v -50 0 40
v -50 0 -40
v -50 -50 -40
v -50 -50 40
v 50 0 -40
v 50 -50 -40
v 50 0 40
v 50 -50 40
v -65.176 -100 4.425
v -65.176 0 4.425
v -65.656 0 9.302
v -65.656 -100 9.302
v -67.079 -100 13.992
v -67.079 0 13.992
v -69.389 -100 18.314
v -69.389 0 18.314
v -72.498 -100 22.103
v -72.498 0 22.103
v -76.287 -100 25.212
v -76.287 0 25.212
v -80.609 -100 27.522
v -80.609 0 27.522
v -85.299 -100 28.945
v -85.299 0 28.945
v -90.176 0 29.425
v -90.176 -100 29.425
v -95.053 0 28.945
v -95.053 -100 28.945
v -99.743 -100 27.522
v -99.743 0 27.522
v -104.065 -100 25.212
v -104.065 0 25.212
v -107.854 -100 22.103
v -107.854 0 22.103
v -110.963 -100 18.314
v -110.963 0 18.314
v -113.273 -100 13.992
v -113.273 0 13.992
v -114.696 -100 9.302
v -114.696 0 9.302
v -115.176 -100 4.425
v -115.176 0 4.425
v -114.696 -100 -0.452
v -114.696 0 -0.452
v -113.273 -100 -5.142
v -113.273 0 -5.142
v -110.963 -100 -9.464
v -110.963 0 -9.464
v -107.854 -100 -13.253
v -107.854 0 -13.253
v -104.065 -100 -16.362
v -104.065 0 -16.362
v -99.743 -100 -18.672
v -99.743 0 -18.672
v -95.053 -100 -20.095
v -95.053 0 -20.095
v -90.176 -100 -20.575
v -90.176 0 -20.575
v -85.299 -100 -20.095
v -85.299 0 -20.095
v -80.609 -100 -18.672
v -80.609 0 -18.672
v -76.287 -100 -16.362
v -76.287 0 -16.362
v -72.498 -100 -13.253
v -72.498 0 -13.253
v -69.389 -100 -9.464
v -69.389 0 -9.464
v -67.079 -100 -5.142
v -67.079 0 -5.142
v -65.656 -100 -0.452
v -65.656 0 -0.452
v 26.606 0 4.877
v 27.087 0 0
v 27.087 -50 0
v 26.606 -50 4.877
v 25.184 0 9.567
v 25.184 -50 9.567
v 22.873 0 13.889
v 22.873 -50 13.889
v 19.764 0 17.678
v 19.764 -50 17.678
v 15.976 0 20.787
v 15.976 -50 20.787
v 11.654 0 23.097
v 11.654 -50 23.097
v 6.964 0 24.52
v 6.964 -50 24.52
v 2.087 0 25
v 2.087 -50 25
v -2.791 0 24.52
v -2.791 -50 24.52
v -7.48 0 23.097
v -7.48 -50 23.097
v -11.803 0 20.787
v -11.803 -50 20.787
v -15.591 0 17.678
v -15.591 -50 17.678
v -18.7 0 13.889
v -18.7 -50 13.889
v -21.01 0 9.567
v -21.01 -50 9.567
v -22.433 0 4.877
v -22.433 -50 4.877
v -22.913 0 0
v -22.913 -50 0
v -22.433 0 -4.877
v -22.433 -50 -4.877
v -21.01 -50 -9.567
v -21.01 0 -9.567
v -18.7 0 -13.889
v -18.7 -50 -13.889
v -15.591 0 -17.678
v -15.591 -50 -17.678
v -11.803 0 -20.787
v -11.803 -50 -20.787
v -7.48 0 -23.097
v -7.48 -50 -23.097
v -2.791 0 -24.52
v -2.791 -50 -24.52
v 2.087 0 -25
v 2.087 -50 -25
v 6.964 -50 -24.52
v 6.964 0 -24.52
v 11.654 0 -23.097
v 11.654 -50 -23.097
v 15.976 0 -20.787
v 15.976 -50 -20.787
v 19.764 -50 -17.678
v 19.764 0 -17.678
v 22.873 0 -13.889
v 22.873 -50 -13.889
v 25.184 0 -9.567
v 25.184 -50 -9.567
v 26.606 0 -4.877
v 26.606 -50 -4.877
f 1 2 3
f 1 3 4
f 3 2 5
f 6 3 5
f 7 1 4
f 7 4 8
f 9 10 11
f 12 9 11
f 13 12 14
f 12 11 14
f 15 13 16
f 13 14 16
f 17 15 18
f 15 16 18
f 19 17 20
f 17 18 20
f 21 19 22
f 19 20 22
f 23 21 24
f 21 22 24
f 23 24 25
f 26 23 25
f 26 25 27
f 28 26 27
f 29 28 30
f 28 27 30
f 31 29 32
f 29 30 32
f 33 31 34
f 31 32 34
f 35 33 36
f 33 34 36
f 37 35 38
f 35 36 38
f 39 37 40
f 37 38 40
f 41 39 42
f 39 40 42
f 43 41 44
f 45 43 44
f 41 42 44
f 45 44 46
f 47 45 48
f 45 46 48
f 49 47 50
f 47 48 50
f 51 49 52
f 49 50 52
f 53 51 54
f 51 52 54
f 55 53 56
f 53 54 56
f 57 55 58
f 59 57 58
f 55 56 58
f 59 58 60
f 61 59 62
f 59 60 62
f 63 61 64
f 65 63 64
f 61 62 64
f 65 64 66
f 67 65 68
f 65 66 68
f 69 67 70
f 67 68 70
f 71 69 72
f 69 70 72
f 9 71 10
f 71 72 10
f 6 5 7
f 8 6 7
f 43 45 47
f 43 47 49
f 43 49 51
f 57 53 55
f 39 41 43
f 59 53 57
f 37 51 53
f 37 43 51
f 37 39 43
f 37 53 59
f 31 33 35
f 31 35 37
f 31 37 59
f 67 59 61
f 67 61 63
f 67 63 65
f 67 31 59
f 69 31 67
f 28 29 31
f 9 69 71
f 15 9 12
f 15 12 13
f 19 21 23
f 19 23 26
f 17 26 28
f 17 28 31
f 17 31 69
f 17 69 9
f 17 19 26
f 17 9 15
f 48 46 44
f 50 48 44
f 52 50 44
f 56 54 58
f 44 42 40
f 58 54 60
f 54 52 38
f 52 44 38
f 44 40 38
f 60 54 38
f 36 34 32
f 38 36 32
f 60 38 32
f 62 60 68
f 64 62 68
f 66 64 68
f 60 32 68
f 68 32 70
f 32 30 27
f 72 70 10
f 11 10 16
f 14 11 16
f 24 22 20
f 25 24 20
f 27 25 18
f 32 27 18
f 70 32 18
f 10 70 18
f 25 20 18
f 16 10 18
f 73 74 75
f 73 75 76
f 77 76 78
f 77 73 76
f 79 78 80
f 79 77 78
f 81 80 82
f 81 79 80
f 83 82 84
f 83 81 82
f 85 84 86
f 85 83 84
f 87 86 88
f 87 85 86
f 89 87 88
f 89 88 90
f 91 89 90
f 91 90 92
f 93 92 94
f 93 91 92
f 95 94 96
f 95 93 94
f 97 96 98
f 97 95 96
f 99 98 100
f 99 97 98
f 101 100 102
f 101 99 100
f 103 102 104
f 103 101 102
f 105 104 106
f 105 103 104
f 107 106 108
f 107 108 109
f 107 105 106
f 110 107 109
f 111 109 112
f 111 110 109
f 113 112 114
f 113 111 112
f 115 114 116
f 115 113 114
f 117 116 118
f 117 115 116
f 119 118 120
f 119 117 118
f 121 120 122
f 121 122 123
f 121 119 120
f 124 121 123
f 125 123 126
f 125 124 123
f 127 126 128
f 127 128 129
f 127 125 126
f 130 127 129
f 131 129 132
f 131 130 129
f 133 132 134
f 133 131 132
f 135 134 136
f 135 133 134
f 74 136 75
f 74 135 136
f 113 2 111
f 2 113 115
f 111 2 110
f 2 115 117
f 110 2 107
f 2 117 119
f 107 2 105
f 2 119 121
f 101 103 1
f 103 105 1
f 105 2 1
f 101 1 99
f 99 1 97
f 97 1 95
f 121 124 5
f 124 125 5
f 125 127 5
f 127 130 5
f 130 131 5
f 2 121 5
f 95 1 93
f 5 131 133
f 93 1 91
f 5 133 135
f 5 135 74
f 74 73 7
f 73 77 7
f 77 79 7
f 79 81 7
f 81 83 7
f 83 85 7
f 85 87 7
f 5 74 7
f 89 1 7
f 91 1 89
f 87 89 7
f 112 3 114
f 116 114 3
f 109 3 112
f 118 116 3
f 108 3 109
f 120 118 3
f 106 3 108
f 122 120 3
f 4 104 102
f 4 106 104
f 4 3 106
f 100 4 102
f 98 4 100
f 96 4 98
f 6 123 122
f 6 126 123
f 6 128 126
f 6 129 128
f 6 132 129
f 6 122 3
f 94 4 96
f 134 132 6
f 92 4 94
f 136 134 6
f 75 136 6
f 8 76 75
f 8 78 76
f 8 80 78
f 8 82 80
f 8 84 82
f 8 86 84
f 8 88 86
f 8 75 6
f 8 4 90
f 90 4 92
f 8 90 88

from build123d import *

# Parameters (mm, degrees)
F0_W     = 100
F0_H     = 80
F1_DEPTH = 50
F2_R     = 25
F3_DEPTH = 50
F4_R     = 25
F5_DEPTH = 100


with BuildPart() as f1:
    # F0 (on Front) → F1 (new body)
    with BuildSketch(Plane.XZ):
        Rectangle(F0_W, F0_H)
    extrude(amount=F1_DEPTH)

    # F2 (on Front) → F3 (cut)
    with BuildSketch(Plane.XZ):
        with Locations((2.086694, 0)):
            Circle(F2_R)
    extrude(amount=F3_DEPTH, mode=Mode.SUBTRACT)


with BuildPart() as f5:
    # F4 (on Front) → F5 (new body)
    with BuildSketch(Plane.XZ):
        with Locations((-90.175971, 4.424878)):
            Circle(F4_R)
    extrude(amount=F5_DEPTH)


solid = Compound([f1.part, f5.part])
